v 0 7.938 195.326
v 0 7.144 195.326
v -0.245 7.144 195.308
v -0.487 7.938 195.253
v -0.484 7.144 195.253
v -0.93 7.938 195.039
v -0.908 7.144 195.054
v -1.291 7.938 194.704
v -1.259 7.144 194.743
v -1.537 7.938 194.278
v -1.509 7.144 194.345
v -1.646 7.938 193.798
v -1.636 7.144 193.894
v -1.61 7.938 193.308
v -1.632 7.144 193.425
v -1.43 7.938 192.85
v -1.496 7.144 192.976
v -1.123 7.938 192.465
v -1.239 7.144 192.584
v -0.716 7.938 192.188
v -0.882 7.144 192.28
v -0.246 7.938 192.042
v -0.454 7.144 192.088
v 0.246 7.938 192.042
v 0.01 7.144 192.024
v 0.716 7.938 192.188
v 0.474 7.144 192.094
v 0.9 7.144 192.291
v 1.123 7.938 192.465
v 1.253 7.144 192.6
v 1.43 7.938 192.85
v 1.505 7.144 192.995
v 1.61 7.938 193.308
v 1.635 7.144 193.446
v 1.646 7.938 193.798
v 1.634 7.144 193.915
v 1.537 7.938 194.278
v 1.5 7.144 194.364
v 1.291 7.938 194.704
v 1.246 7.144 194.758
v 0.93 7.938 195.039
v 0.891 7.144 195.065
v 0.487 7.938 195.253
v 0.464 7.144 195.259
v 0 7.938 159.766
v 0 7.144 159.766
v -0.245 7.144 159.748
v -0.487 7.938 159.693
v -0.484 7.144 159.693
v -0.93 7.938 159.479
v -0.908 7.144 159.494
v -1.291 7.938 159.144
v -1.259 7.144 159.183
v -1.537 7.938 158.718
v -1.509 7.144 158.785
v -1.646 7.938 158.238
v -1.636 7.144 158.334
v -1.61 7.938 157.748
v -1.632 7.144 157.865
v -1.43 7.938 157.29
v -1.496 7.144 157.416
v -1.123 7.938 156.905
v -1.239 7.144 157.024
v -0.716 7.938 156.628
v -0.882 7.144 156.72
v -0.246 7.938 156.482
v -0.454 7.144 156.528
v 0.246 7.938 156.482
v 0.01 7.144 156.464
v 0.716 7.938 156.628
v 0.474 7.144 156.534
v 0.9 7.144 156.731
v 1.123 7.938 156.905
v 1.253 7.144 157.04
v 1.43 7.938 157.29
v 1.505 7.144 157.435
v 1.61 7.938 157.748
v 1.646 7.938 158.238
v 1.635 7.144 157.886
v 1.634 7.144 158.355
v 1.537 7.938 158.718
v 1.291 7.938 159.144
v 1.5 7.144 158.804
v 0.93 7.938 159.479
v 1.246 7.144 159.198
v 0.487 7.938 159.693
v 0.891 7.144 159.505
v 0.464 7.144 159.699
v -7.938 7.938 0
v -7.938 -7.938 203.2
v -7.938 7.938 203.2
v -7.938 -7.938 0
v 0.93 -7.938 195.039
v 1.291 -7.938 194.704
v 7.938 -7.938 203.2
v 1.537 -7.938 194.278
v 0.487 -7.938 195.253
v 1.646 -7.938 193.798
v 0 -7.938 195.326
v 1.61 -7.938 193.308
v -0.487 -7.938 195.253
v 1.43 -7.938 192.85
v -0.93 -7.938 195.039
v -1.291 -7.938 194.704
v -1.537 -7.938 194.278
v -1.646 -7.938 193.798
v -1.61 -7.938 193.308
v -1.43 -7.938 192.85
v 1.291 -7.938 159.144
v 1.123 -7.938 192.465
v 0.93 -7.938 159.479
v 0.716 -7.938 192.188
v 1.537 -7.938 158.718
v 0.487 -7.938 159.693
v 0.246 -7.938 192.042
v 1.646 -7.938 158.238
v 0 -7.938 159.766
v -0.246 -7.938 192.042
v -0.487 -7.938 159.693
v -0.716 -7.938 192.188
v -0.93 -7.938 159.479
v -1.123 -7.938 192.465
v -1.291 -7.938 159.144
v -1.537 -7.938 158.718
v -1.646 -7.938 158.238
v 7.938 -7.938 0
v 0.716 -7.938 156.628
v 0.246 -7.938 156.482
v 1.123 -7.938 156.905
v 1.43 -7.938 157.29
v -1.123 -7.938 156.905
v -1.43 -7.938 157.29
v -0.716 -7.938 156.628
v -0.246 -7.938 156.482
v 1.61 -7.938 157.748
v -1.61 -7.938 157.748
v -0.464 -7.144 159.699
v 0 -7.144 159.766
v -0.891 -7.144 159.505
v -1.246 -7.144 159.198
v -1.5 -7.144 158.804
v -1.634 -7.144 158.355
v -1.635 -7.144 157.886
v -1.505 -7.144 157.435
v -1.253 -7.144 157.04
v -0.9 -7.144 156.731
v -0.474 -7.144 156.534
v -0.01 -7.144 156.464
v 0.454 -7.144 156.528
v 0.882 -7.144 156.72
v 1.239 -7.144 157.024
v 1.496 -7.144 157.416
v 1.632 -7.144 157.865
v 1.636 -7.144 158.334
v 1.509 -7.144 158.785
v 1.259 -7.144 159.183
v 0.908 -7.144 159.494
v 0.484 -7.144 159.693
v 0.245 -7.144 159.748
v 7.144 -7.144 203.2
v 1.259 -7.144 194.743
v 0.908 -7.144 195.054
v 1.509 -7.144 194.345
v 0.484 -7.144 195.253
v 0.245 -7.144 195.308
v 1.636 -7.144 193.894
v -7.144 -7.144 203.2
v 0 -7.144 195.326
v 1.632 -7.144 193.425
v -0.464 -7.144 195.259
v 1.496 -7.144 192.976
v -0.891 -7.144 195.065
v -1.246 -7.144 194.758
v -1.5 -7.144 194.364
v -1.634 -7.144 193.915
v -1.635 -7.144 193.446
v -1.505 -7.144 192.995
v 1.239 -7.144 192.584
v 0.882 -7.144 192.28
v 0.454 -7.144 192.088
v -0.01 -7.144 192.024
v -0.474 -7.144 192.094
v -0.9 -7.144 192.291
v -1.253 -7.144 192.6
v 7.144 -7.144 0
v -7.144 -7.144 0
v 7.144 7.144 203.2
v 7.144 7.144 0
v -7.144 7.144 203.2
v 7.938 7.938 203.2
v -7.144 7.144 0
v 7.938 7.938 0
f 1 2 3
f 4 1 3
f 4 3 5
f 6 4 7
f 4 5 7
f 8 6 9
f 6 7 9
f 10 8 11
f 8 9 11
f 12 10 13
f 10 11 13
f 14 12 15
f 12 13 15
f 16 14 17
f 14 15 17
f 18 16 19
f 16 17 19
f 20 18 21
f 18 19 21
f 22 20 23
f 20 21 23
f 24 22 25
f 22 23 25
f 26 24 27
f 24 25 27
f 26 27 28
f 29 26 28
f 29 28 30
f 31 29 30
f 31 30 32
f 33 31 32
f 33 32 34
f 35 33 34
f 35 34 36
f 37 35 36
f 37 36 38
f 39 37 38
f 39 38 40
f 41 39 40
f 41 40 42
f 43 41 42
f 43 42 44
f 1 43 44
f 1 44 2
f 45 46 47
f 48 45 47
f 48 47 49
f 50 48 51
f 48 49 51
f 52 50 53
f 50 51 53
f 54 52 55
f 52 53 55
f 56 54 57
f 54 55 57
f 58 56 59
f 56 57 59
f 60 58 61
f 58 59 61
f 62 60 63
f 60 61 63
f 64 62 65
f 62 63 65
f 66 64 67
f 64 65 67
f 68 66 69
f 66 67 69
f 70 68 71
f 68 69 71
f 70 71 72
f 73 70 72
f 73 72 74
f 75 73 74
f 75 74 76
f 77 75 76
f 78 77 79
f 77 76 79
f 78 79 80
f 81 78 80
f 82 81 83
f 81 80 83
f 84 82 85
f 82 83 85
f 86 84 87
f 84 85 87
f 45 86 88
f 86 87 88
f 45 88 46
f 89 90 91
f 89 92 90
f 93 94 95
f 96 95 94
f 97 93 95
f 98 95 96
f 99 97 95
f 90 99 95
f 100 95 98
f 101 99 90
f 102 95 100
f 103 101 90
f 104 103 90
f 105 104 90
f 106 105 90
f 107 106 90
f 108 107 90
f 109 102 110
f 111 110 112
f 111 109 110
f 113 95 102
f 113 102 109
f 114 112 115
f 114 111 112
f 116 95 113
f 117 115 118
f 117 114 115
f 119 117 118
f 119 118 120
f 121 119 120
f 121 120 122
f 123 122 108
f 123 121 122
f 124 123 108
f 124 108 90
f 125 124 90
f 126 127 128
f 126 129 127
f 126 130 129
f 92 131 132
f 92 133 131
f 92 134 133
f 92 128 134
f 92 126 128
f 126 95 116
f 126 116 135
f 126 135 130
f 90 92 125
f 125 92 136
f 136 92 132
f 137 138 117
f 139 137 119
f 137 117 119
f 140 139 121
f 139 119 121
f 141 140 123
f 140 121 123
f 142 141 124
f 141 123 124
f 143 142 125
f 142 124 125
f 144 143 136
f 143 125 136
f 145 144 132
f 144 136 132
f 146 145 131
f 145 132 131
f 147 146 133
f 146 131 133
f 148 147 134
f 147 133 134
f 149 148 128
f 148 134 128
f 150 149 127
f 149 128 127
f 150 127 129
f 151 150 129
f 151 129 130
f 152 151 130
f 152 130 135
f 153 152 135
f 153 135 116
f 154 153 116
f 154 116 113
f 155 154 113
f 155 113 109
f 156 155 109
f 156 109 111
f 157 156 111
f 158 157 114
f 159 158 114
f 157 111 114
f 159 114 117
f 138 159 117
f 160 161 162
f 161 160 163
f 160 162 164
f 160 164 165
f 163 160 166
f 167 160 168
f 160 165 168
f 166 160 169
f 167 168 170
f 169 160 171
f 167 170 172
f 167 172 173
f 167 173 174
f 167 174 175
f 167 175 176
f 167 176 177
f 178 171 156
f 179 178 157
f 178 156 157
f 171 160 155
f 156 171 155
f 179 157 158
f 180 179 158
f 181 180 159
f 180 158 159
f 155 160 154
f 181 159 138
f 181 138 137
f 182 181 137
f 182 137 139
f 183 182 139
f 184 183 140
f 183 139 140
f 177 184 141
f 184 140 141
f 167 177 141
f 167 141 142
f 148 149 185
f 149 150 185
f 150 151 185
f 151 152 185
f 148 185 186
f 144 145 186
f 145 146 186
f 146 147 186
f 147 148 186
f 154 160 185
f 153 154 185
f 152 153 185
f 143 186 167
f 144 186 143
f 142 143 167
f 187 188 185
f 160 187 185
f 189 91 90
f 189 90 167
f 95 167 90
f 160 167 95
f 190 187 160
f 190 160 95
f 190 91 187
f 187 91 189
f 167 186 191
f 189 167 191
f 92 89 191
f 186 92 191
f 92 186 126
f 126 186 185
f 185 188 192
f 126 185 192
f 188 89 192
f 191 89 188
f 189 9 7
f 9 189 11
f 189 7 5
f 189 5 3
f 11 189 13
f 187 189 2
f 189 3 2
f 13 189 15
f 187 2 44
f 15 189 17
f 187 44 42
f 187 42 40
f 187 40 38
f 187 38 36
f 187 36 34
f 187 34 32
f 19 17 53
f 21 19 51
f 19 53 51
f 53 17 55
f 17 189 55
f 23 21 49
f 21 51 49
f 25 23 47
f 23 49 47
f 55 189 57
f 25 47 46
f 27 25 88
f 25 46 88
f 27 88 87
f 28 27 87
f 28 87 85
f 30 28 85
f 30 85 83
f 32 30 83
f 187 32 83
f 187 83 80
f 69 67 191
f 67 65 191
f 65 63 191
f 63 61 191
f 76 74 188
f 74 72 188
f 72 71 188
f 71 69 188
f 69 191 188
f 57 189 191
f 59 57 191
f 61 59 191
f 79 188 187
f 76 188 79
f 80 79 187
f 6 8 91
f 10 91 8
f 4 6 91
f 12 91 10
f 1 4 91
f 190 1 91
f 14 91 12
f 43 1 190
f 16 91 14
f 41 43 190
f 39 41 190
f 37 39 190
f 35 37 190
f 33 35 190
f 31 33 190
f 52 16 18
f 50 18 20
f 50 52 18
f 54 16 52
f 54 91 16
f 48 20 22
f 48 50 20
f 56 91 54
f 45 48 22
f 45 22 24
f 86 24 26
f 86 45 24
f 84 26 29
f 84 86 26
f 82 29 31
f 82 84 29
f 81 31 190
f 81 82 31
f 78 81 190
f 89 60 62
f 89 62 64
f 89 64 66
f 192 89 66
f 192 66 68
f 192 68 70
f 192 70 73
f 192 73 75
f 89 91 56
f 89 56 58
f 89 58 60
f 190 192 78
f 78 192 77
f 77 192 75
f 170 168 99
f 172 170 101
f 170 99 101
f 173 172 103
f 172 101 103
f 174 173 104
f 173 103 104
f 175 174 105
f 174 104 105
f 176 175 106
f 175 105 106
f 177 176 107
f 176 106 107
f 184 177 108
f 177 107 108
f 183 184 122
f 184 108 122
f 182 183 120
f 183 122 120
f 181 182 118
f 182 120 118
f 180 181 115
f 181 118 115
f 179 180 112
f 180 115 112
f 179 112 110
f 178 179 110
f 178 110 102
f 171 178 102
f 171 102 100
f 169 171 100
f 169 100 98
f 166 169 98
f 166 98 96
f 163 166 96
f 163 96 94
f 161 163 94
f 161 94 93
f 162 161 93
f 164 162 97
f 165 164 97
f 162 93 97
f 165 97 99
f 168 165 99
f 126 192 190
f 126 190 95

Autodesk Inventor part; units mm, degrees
ref_plane "YZ Plane" through (0, 0, 0) normal (1, 0, 0) x (0, 1, 0)
ref_plane "XZ Plane" through (0, 0, 0) normal (0, 1, 0) x (-1, 0, 0)
ref_plane "XY Plane" through (0, 0, 0) normal (0, 0, 1) x (1, 0, 0)
sketch "Sketch1" plane through (0, 0, 0) normal (0, 0, 1) x (1, 0, 0)
  line L0 (7.9375, -7.9375) -> (-7.9375, -7.9375)
  line L1 (-7.9375, -7.9375) -> (-7.9375, 7.9375)
  line L2 (-7.9375, 7.9375) -> (7.9375, 7.9375)
  line L3 (7.9375, 7.9375) -> (7.9375, -7.9375)
  line L4 (-7.1437, -7.1438) -> (-7.1437, 7.1437)
  line L5 (-7.1437, 7.1437) -> (7.1437, 7.1438)
  line L6 (7.1437, 7.1438) -> (7.1438, -7.1437)
  line L7 (7.1438, -7.1437) -> (-7.1437, -7.1438)
  line L8 (0, 0) -> (5.5522, 0)
  point P0 (0, 0)
  point P1 (0, 0)
  point P2 (0, 0)
  dimension "d4" = 45
  dimension "d5" = 14.2875
  dimension "d6" = 15.875
extrude "Extrusion1" add sketch "Sketch1" along normal blind 203.2
sketch "Sketch2" plane through (-7.9375, 7.9375, 0) normal (0, 1, 0) x (1, 0, 0)
  line L0 (0, -203.2) -> (15.875, -203.2) projected
  line L1 (15.875, 0) -> (15.875, -203.2) projected
  line L2 (0, 0) -> (0, -203.2) projected
  line L3 (7.9375, -203.2) -> (7.9375, -257.0929)
  line L4 (7.9375, -193.675) -> (26.9875, -193.675) construction
  point P0 (7.9375, 0)
  point P1 (7.9375, -158.115)
  dimension "d27" = 9.525
  dimension "d30" = 35.56
hole "Hole1" at (0, 7.9375, 193.675) at (0, 7.9375, 158.115) direction (0, -1, 0) diameter 3.302 end through all thread size "8-32 UNC" class "2B" standard "ANSI Unified Screw Threads"
properties part number "Arm"
